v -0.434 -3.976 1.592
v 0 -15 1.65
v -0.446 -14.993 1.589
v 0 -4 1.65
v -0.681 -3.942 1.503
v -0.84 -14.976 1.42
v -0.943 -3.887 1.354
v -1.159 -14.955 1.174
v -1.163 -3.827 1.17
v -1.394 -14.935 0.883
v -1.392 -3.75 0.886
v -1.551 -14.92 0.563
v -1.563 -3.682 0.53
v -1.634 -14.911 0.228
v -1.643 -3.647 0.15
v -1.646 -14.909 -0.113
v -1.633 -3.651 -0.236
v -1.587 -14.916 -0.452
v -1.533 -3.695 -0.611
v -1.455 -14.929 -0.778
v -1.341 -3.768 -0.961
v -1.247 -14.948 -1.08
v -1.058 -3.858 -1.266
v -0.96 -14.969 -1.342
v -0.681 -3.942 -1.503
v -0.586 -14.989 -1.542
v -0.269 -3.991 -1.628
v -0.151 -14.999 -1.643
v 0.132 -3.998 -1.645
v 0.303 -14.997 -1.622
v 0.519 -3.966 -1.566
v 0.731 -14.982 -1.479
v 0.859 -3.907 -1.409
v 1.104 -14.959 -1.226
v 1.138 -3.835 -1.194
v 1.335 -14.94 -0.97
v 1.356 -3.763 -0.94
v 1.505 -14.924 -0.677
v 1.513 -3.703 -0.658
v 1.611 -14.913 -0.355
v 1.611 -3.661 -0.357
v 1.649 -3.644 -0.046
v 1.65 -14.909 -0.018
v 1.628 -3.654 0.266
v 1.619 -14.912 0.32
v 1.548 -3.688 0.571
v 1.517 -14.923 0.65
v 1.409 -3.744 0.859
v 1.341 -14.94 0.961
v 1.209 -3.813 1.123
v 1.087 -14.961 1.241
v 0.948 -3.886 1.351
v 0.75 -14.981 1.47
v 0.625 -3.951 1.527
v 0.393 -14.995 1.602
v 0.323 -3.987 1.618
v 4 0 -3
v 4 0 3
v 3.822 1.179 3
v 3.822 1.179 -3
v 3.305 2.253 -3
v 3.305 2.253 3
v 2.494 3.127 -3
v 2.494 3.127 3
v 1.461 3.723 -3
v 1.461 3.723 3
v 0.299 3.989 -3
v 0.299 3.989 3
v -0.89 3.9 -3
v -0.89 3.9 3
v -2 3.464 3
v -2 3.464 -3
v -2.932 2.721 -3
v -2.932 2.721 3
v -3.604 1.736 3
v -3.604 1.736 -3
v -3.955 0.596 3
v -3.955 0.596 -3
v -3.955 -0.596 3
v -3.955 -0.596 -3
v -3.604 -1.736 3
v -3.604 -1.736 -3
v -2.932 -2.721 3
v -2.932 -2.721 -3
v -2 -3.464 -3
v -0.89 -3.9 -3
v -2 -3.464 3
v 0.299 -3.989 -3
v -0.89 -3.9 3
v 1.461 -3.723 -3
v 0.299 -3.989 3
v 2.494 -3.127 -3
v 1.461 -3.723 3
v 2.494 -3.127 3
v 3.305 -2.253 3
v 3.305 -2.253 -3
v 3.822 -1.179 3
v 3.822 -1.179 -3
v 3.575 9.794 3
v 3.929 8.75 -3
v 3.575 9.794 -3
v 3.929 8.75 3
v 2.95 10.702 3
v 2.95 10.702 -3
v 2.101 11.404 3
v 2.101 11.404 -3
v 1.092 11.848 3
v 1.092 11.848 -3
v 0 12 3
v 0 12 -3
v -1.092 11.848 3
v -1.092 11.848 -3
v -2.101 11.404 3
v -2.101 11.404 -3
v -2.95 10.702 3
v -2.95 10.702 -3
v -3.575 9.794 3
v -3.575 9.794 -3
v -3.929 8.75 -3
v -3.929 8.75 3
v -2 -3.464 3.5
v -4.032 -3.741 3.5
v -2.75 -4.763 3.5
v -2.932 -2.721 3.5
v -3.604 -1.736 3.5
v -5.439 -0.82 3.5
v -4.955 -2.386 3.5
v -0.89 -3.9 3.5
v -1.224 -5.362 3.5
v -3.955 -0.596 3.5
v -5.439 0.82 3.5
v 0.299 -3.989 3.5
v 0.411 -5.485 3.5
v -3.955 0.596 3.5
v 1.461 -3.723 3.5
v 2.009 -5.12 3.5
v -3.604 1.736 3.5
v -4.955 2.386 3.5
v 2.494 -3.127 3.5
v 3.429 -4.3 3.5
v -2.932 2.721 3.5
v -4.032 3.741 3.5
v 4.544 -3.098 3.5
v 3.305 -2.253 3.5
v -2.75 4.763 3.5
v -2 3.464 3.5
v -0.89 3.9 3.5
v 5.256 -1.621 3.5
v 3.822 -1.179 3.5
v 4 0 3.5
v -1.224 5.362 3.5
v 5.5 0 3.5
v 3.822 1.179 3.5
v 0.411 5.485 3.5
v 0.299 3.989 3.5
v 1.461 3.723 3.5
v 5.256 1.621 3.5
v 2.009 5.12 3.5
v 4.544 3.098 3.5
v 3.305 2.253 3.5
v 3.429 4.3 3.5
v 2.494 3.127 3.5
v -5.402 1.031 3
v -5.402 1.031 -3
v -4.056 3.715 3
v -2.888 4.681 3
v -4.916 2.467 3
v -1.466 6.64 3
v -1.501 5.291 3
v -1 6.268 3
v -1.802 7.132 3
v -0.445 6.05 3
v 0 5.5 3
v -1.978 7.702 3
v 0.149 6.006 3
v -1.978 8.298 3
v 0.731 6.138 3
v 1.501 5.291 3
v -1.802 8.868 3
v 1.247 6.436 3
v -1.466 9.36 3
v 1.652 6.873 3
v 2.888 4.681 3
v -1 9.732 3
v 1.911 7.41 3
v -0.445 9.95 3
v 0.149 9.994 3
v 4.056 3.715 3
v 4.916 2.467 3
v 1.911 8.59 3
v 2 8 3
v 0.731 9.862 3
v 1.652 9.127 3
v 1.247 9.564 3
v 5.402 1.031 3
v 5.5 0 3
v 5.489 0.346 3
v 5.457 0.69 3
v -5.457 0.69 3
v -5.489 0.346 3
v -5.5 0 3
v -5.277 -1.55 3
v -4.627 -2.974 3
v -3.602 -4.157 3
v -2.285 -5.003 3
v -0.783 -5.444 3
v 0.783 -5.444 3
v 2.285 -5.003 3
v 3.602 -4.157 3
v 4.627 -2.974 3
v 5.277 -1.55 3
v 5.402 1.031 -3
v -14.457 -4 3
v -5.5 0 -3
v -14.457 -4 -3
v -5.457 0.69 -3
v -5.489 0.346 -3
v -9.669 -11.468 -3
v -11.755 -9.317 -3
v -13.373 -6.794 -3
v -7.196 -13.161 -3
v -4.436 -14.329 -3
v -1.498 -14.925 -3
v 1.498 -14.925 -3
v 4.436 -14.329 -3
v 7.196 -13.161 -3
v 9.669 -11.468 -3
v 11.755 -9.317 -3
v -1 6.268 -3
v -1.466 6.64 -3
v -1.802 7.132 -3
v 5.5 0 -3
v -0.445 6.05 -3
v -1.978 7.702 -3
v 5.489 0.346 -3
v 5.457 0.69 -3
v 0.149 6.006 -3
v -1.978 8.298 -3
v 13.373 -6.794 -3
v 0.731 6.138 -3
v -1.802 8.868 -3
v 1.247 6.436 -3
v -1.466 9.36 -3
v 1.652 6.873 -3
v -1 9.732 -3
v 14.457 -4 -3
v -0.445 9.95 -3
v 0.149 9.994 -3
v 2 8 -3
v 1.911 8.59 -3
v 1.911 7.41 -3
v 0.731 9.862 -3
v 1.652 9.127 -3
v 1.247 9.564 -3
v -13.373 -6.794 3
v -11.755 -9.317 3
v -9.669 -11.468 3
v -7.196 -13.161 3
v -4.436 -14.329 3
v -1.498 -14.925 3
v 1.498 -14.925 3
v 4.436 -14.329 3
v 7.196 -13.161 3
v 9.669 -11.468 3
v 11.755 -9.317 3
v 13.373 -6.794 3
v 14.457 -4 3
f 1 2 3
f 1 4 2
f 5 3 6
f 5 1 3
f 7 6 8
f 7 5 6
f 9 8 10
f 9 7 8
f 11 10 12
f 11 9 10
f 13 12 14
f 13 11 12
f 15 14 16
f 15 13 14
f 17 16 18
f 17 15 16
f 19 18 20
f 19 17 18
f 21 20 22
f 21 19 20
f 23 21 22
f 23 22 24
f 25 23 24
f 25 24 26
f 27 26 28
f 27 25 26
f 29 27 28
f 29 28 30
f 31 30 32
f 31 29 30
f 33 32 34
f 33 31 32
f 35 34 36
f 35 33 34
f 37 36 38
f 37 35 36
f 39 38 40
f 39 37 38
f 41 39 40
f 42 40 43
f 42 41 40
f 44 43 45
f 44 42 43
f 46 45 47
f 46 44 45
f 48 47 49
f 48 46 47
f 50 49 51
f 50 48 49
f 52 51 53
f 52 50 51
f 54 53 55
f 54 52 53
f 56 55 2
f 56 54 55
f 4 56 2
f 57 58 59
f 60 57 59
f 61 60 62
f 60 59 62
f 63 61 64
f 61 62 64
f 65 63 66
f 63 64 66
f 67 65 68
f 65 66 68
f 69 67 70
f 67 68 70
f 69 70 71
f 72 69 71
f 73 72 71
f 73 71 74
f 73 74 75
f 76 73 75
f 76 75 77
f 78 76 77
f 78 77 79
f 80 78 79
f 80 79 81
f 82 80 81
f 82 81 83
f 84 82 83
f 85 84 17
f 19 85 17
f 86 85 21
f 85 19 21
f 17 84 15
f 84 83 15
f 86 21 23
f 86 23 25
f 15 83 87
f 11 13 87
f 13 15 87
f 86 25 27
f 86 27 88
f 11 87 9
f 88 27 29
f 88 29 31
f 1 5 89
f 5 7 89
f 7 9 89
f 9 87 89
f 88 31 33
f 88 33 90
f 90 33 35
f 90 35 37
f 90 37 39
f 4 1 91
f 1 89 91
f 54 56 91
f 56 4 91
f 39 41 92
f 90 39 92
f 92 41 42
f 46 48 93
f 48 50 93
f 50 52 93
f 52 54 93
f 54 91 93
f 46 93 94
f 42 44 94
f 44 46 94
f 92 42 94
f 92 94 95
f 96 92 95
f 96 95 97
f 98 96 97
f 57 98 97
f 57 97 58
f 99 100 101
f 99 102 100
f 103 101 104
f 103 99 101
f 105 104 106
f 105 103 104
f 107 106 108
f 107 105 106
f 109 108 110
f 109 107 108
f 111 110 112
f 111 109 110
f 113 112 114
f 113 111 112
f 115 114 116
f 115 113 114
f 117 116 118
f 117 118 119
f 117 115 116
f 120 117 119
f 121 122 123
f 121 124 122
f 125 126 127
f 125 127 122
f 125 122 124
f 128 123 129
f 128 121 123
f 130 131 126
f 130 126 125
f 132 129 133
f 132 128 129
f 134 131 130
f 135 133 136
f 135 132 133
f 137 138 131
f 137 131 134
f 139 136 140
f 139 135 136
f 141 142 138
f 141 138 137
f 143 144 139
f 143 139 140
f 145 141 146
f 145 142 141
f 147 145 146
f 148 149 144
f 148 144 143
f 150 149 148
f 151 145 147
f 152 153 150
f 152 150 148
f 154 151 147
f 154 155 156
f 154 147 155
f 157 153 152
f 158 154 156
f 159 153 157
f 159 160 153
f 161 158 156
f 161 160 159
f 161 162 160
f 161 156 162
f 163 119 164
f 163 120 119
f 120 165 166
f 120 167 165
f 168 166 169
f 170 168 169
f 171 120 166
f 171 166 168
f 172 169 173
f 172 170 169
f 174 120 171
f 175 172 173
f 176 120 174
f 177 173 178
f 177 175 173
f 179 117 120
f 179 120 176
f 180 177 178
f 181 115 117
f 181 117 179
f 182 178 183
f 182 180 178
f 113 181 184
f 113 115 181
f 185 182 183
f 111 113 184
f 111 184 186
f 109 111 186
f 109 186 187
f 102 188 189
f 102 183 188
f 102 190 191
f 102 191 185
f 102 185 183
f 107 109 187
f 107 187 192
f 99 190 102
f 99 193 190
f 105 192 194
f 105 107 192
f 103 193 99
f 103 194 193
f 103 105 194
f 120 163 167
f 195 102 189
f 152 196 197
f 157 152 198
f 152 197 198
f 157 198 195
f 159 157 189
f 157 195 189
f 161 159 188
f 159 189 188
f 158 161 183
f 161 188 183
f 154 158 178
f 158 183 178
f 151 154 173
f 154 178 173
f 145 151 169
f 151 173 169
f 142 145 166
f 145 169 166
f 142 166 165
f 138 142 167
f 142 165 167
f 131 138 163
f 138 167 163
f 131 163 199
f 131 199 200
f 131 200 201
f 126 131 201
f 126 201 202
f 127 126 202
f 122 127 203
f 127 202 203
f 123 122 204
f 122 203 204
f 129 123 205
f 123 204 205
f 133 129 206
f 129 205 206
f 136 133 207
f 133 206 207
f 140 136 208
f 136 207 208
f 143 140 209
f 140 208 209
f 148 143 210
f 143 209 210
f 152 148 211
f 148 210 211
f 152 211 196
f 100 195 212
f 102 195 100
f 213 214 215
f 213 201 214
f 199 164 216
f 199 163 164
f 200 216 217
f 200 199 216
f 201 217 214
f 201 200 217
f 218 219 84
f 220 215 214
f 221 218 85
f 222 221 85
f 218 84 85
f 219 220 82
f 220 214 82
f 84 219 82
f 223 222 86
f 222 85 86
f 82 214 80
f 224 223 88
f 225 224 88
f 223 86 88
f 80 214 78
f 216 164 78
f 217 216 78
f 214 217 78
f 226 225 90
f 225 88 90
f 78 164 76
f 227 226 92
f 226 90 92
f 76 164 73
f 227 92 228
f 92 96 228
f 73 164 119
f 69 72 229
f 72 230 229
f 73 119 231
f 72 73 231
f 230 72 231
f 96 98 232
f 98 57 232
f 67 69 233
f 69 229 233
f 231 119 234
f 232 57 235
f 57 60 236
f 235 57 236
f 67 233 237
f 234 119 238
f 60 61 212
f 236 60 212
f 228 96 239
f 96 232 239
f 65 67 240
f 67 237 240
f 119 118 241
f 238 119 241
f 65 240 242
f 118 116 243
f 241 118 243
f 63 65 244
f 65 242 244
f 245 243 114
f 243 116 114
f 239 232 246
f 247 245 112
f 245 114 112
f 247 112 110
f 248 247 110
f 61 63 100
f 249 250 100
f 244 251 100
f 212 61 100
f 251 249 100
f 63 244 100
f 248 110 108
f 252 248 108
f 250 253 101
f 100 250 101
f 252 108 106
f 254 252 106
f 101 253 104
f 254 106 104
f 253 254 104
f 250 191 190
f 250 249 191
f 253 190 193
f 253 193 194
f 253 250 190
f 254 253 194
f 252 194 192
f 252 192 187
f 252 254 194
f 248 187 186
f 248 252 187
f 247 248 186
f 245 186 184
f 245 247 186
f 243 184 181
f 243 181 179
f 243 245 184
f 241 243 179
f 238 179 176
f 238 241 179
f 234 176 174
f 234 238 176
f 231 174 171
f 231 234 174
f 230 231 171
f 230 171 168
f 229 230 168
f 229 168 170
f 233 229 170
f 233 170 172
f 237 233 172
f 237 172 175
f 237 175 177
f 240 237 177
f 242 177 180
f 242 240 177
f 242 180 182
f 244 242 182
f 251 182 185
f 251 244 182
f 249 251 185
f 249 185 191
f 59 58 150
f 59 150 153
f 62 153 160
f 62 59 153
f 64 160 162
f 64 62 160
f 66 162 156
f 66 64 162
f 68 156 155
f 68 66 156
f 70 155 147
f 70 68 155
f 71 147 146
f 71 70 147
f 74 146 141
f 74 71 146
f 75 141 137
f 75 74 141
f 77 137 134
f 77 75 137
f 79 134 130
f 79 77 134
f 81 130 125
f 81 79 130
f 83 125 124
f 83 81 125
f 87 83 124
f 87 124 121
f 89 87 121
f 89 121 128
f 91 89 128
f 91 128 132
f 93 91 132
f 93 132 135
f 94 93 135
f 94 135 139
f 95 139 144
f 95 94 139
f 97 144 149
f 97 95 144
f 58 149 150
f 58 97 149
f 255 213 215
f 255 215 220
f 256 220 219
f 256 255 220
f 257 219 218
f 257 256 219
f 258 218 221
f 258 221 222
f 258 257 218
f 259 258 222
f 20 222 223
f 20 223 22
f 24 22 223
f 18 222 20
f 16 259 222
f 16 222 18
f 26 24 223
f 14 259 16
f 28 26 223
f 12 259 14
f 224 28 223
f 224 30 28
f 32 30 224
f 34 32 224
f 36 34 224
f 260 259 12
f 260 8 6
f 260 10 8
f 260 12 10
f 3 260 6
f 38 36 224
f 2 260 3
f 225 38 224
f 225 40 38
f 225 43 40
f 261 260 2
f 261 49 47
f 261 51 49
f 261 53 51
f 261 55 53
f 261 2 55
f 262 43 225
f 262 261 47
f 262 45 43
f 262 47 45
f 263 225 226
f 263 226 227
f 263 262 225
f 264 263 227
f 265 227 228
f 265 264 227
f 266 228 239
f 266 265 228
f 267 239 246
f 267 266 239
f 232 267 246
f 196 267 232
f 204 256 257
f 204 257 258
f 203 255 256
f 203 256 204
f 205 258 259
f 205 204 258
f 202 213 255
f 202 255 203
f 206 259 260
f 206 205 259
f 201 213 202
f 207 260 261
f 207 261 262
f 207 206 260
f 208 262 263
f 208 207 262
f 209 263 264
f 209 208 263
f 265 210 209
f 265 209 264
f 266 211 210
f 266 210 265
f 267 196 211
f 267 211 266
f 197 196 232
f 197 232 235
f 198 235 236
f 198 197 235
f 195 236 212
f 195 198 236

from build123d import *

# Parameters (mm, degrees)
SKETCH1_R           = 2
BOSS_EXTRUDE1_DEPTH = 3
SKETCH2_R           = 5.5
SKETCH2_R_2         = 4
BOSS_EXTRUDE2_DEPTH = 0.5
SKETCH4_R           = 4
CUT_EXTRUDE2_DEPTH  = 7


with BuildPart() as part:
    # Sketch1 → Boss-Extrude1 (new body, symmetric)
    with BuildSketch(Plane.XY):
        with BuildLine():
            Line((-5.5, 0), (-14.456832295, -4))
            ThreePointArc((-14.456832295, -4), (0, -15), (14.456832295, -4))
            Line((14.456832295, -4), (5.5, 0))
            ThreePointArc((5.5, 0), (5.475559526, 0.517926522), (5.402455316, 1.03125))
            Line((5.402455316, 1.03125), (3.929058411, 8.75))
            ThreePointArc((3.929058411, 8.75), (0, 12), (-3.929058411, 8.75))
            Line((-3.929058411, 8.75), (-5.402455316, 1.03125))
            ThreePointArc((-5.402455316, 1.03125), (-5.475559526, 0.517926522), (-5.5, 0))
        make_face()
        with Locations((0, 8)):
            Circle(SKETCH1_R, mode=Mode.SUBTRACT)
    extrude(amount=BOSS_EXTRUDE1_DEPTH, both=True)

    # Sketch2 → Boss-Extrude2 (add)
    with BuildSketch(Plane.XY.offset(3)):
        Circle(SKETCH2_R)
        Circle(SKETCH2_R_2, mode=Mode.SUBTRACT)
    extrude(amount=BOSS_EXTRUDE2_DEPTH)

    # Sketch4 → Cut-Extrude2 (cut, through all)
    with BuildSketch(Plane.XY.offset(3)):
        Circle(SKETCH4_R)
    extrude(amount=-CUT_EXTRUDE2_DEPTH, mode=Mode.SUBTRACT)

    # Sketch8 → M4 Tapped Hole1 (revolve, cut)
    with BuildSketch(Plane(origin=(0, 0, 0), x_dir=(0, 0, 1), z_dir=(1, 0, 0))):
        Polygon((0, 0), (0, 22.491420021), (1.65, 21.5), (1.65, 0), align=None)
    revolve(axis=Axis((0, 6.35, 0), (0, -1, 0)), mode=Mode.SUBTRACT)


solid = part.part
